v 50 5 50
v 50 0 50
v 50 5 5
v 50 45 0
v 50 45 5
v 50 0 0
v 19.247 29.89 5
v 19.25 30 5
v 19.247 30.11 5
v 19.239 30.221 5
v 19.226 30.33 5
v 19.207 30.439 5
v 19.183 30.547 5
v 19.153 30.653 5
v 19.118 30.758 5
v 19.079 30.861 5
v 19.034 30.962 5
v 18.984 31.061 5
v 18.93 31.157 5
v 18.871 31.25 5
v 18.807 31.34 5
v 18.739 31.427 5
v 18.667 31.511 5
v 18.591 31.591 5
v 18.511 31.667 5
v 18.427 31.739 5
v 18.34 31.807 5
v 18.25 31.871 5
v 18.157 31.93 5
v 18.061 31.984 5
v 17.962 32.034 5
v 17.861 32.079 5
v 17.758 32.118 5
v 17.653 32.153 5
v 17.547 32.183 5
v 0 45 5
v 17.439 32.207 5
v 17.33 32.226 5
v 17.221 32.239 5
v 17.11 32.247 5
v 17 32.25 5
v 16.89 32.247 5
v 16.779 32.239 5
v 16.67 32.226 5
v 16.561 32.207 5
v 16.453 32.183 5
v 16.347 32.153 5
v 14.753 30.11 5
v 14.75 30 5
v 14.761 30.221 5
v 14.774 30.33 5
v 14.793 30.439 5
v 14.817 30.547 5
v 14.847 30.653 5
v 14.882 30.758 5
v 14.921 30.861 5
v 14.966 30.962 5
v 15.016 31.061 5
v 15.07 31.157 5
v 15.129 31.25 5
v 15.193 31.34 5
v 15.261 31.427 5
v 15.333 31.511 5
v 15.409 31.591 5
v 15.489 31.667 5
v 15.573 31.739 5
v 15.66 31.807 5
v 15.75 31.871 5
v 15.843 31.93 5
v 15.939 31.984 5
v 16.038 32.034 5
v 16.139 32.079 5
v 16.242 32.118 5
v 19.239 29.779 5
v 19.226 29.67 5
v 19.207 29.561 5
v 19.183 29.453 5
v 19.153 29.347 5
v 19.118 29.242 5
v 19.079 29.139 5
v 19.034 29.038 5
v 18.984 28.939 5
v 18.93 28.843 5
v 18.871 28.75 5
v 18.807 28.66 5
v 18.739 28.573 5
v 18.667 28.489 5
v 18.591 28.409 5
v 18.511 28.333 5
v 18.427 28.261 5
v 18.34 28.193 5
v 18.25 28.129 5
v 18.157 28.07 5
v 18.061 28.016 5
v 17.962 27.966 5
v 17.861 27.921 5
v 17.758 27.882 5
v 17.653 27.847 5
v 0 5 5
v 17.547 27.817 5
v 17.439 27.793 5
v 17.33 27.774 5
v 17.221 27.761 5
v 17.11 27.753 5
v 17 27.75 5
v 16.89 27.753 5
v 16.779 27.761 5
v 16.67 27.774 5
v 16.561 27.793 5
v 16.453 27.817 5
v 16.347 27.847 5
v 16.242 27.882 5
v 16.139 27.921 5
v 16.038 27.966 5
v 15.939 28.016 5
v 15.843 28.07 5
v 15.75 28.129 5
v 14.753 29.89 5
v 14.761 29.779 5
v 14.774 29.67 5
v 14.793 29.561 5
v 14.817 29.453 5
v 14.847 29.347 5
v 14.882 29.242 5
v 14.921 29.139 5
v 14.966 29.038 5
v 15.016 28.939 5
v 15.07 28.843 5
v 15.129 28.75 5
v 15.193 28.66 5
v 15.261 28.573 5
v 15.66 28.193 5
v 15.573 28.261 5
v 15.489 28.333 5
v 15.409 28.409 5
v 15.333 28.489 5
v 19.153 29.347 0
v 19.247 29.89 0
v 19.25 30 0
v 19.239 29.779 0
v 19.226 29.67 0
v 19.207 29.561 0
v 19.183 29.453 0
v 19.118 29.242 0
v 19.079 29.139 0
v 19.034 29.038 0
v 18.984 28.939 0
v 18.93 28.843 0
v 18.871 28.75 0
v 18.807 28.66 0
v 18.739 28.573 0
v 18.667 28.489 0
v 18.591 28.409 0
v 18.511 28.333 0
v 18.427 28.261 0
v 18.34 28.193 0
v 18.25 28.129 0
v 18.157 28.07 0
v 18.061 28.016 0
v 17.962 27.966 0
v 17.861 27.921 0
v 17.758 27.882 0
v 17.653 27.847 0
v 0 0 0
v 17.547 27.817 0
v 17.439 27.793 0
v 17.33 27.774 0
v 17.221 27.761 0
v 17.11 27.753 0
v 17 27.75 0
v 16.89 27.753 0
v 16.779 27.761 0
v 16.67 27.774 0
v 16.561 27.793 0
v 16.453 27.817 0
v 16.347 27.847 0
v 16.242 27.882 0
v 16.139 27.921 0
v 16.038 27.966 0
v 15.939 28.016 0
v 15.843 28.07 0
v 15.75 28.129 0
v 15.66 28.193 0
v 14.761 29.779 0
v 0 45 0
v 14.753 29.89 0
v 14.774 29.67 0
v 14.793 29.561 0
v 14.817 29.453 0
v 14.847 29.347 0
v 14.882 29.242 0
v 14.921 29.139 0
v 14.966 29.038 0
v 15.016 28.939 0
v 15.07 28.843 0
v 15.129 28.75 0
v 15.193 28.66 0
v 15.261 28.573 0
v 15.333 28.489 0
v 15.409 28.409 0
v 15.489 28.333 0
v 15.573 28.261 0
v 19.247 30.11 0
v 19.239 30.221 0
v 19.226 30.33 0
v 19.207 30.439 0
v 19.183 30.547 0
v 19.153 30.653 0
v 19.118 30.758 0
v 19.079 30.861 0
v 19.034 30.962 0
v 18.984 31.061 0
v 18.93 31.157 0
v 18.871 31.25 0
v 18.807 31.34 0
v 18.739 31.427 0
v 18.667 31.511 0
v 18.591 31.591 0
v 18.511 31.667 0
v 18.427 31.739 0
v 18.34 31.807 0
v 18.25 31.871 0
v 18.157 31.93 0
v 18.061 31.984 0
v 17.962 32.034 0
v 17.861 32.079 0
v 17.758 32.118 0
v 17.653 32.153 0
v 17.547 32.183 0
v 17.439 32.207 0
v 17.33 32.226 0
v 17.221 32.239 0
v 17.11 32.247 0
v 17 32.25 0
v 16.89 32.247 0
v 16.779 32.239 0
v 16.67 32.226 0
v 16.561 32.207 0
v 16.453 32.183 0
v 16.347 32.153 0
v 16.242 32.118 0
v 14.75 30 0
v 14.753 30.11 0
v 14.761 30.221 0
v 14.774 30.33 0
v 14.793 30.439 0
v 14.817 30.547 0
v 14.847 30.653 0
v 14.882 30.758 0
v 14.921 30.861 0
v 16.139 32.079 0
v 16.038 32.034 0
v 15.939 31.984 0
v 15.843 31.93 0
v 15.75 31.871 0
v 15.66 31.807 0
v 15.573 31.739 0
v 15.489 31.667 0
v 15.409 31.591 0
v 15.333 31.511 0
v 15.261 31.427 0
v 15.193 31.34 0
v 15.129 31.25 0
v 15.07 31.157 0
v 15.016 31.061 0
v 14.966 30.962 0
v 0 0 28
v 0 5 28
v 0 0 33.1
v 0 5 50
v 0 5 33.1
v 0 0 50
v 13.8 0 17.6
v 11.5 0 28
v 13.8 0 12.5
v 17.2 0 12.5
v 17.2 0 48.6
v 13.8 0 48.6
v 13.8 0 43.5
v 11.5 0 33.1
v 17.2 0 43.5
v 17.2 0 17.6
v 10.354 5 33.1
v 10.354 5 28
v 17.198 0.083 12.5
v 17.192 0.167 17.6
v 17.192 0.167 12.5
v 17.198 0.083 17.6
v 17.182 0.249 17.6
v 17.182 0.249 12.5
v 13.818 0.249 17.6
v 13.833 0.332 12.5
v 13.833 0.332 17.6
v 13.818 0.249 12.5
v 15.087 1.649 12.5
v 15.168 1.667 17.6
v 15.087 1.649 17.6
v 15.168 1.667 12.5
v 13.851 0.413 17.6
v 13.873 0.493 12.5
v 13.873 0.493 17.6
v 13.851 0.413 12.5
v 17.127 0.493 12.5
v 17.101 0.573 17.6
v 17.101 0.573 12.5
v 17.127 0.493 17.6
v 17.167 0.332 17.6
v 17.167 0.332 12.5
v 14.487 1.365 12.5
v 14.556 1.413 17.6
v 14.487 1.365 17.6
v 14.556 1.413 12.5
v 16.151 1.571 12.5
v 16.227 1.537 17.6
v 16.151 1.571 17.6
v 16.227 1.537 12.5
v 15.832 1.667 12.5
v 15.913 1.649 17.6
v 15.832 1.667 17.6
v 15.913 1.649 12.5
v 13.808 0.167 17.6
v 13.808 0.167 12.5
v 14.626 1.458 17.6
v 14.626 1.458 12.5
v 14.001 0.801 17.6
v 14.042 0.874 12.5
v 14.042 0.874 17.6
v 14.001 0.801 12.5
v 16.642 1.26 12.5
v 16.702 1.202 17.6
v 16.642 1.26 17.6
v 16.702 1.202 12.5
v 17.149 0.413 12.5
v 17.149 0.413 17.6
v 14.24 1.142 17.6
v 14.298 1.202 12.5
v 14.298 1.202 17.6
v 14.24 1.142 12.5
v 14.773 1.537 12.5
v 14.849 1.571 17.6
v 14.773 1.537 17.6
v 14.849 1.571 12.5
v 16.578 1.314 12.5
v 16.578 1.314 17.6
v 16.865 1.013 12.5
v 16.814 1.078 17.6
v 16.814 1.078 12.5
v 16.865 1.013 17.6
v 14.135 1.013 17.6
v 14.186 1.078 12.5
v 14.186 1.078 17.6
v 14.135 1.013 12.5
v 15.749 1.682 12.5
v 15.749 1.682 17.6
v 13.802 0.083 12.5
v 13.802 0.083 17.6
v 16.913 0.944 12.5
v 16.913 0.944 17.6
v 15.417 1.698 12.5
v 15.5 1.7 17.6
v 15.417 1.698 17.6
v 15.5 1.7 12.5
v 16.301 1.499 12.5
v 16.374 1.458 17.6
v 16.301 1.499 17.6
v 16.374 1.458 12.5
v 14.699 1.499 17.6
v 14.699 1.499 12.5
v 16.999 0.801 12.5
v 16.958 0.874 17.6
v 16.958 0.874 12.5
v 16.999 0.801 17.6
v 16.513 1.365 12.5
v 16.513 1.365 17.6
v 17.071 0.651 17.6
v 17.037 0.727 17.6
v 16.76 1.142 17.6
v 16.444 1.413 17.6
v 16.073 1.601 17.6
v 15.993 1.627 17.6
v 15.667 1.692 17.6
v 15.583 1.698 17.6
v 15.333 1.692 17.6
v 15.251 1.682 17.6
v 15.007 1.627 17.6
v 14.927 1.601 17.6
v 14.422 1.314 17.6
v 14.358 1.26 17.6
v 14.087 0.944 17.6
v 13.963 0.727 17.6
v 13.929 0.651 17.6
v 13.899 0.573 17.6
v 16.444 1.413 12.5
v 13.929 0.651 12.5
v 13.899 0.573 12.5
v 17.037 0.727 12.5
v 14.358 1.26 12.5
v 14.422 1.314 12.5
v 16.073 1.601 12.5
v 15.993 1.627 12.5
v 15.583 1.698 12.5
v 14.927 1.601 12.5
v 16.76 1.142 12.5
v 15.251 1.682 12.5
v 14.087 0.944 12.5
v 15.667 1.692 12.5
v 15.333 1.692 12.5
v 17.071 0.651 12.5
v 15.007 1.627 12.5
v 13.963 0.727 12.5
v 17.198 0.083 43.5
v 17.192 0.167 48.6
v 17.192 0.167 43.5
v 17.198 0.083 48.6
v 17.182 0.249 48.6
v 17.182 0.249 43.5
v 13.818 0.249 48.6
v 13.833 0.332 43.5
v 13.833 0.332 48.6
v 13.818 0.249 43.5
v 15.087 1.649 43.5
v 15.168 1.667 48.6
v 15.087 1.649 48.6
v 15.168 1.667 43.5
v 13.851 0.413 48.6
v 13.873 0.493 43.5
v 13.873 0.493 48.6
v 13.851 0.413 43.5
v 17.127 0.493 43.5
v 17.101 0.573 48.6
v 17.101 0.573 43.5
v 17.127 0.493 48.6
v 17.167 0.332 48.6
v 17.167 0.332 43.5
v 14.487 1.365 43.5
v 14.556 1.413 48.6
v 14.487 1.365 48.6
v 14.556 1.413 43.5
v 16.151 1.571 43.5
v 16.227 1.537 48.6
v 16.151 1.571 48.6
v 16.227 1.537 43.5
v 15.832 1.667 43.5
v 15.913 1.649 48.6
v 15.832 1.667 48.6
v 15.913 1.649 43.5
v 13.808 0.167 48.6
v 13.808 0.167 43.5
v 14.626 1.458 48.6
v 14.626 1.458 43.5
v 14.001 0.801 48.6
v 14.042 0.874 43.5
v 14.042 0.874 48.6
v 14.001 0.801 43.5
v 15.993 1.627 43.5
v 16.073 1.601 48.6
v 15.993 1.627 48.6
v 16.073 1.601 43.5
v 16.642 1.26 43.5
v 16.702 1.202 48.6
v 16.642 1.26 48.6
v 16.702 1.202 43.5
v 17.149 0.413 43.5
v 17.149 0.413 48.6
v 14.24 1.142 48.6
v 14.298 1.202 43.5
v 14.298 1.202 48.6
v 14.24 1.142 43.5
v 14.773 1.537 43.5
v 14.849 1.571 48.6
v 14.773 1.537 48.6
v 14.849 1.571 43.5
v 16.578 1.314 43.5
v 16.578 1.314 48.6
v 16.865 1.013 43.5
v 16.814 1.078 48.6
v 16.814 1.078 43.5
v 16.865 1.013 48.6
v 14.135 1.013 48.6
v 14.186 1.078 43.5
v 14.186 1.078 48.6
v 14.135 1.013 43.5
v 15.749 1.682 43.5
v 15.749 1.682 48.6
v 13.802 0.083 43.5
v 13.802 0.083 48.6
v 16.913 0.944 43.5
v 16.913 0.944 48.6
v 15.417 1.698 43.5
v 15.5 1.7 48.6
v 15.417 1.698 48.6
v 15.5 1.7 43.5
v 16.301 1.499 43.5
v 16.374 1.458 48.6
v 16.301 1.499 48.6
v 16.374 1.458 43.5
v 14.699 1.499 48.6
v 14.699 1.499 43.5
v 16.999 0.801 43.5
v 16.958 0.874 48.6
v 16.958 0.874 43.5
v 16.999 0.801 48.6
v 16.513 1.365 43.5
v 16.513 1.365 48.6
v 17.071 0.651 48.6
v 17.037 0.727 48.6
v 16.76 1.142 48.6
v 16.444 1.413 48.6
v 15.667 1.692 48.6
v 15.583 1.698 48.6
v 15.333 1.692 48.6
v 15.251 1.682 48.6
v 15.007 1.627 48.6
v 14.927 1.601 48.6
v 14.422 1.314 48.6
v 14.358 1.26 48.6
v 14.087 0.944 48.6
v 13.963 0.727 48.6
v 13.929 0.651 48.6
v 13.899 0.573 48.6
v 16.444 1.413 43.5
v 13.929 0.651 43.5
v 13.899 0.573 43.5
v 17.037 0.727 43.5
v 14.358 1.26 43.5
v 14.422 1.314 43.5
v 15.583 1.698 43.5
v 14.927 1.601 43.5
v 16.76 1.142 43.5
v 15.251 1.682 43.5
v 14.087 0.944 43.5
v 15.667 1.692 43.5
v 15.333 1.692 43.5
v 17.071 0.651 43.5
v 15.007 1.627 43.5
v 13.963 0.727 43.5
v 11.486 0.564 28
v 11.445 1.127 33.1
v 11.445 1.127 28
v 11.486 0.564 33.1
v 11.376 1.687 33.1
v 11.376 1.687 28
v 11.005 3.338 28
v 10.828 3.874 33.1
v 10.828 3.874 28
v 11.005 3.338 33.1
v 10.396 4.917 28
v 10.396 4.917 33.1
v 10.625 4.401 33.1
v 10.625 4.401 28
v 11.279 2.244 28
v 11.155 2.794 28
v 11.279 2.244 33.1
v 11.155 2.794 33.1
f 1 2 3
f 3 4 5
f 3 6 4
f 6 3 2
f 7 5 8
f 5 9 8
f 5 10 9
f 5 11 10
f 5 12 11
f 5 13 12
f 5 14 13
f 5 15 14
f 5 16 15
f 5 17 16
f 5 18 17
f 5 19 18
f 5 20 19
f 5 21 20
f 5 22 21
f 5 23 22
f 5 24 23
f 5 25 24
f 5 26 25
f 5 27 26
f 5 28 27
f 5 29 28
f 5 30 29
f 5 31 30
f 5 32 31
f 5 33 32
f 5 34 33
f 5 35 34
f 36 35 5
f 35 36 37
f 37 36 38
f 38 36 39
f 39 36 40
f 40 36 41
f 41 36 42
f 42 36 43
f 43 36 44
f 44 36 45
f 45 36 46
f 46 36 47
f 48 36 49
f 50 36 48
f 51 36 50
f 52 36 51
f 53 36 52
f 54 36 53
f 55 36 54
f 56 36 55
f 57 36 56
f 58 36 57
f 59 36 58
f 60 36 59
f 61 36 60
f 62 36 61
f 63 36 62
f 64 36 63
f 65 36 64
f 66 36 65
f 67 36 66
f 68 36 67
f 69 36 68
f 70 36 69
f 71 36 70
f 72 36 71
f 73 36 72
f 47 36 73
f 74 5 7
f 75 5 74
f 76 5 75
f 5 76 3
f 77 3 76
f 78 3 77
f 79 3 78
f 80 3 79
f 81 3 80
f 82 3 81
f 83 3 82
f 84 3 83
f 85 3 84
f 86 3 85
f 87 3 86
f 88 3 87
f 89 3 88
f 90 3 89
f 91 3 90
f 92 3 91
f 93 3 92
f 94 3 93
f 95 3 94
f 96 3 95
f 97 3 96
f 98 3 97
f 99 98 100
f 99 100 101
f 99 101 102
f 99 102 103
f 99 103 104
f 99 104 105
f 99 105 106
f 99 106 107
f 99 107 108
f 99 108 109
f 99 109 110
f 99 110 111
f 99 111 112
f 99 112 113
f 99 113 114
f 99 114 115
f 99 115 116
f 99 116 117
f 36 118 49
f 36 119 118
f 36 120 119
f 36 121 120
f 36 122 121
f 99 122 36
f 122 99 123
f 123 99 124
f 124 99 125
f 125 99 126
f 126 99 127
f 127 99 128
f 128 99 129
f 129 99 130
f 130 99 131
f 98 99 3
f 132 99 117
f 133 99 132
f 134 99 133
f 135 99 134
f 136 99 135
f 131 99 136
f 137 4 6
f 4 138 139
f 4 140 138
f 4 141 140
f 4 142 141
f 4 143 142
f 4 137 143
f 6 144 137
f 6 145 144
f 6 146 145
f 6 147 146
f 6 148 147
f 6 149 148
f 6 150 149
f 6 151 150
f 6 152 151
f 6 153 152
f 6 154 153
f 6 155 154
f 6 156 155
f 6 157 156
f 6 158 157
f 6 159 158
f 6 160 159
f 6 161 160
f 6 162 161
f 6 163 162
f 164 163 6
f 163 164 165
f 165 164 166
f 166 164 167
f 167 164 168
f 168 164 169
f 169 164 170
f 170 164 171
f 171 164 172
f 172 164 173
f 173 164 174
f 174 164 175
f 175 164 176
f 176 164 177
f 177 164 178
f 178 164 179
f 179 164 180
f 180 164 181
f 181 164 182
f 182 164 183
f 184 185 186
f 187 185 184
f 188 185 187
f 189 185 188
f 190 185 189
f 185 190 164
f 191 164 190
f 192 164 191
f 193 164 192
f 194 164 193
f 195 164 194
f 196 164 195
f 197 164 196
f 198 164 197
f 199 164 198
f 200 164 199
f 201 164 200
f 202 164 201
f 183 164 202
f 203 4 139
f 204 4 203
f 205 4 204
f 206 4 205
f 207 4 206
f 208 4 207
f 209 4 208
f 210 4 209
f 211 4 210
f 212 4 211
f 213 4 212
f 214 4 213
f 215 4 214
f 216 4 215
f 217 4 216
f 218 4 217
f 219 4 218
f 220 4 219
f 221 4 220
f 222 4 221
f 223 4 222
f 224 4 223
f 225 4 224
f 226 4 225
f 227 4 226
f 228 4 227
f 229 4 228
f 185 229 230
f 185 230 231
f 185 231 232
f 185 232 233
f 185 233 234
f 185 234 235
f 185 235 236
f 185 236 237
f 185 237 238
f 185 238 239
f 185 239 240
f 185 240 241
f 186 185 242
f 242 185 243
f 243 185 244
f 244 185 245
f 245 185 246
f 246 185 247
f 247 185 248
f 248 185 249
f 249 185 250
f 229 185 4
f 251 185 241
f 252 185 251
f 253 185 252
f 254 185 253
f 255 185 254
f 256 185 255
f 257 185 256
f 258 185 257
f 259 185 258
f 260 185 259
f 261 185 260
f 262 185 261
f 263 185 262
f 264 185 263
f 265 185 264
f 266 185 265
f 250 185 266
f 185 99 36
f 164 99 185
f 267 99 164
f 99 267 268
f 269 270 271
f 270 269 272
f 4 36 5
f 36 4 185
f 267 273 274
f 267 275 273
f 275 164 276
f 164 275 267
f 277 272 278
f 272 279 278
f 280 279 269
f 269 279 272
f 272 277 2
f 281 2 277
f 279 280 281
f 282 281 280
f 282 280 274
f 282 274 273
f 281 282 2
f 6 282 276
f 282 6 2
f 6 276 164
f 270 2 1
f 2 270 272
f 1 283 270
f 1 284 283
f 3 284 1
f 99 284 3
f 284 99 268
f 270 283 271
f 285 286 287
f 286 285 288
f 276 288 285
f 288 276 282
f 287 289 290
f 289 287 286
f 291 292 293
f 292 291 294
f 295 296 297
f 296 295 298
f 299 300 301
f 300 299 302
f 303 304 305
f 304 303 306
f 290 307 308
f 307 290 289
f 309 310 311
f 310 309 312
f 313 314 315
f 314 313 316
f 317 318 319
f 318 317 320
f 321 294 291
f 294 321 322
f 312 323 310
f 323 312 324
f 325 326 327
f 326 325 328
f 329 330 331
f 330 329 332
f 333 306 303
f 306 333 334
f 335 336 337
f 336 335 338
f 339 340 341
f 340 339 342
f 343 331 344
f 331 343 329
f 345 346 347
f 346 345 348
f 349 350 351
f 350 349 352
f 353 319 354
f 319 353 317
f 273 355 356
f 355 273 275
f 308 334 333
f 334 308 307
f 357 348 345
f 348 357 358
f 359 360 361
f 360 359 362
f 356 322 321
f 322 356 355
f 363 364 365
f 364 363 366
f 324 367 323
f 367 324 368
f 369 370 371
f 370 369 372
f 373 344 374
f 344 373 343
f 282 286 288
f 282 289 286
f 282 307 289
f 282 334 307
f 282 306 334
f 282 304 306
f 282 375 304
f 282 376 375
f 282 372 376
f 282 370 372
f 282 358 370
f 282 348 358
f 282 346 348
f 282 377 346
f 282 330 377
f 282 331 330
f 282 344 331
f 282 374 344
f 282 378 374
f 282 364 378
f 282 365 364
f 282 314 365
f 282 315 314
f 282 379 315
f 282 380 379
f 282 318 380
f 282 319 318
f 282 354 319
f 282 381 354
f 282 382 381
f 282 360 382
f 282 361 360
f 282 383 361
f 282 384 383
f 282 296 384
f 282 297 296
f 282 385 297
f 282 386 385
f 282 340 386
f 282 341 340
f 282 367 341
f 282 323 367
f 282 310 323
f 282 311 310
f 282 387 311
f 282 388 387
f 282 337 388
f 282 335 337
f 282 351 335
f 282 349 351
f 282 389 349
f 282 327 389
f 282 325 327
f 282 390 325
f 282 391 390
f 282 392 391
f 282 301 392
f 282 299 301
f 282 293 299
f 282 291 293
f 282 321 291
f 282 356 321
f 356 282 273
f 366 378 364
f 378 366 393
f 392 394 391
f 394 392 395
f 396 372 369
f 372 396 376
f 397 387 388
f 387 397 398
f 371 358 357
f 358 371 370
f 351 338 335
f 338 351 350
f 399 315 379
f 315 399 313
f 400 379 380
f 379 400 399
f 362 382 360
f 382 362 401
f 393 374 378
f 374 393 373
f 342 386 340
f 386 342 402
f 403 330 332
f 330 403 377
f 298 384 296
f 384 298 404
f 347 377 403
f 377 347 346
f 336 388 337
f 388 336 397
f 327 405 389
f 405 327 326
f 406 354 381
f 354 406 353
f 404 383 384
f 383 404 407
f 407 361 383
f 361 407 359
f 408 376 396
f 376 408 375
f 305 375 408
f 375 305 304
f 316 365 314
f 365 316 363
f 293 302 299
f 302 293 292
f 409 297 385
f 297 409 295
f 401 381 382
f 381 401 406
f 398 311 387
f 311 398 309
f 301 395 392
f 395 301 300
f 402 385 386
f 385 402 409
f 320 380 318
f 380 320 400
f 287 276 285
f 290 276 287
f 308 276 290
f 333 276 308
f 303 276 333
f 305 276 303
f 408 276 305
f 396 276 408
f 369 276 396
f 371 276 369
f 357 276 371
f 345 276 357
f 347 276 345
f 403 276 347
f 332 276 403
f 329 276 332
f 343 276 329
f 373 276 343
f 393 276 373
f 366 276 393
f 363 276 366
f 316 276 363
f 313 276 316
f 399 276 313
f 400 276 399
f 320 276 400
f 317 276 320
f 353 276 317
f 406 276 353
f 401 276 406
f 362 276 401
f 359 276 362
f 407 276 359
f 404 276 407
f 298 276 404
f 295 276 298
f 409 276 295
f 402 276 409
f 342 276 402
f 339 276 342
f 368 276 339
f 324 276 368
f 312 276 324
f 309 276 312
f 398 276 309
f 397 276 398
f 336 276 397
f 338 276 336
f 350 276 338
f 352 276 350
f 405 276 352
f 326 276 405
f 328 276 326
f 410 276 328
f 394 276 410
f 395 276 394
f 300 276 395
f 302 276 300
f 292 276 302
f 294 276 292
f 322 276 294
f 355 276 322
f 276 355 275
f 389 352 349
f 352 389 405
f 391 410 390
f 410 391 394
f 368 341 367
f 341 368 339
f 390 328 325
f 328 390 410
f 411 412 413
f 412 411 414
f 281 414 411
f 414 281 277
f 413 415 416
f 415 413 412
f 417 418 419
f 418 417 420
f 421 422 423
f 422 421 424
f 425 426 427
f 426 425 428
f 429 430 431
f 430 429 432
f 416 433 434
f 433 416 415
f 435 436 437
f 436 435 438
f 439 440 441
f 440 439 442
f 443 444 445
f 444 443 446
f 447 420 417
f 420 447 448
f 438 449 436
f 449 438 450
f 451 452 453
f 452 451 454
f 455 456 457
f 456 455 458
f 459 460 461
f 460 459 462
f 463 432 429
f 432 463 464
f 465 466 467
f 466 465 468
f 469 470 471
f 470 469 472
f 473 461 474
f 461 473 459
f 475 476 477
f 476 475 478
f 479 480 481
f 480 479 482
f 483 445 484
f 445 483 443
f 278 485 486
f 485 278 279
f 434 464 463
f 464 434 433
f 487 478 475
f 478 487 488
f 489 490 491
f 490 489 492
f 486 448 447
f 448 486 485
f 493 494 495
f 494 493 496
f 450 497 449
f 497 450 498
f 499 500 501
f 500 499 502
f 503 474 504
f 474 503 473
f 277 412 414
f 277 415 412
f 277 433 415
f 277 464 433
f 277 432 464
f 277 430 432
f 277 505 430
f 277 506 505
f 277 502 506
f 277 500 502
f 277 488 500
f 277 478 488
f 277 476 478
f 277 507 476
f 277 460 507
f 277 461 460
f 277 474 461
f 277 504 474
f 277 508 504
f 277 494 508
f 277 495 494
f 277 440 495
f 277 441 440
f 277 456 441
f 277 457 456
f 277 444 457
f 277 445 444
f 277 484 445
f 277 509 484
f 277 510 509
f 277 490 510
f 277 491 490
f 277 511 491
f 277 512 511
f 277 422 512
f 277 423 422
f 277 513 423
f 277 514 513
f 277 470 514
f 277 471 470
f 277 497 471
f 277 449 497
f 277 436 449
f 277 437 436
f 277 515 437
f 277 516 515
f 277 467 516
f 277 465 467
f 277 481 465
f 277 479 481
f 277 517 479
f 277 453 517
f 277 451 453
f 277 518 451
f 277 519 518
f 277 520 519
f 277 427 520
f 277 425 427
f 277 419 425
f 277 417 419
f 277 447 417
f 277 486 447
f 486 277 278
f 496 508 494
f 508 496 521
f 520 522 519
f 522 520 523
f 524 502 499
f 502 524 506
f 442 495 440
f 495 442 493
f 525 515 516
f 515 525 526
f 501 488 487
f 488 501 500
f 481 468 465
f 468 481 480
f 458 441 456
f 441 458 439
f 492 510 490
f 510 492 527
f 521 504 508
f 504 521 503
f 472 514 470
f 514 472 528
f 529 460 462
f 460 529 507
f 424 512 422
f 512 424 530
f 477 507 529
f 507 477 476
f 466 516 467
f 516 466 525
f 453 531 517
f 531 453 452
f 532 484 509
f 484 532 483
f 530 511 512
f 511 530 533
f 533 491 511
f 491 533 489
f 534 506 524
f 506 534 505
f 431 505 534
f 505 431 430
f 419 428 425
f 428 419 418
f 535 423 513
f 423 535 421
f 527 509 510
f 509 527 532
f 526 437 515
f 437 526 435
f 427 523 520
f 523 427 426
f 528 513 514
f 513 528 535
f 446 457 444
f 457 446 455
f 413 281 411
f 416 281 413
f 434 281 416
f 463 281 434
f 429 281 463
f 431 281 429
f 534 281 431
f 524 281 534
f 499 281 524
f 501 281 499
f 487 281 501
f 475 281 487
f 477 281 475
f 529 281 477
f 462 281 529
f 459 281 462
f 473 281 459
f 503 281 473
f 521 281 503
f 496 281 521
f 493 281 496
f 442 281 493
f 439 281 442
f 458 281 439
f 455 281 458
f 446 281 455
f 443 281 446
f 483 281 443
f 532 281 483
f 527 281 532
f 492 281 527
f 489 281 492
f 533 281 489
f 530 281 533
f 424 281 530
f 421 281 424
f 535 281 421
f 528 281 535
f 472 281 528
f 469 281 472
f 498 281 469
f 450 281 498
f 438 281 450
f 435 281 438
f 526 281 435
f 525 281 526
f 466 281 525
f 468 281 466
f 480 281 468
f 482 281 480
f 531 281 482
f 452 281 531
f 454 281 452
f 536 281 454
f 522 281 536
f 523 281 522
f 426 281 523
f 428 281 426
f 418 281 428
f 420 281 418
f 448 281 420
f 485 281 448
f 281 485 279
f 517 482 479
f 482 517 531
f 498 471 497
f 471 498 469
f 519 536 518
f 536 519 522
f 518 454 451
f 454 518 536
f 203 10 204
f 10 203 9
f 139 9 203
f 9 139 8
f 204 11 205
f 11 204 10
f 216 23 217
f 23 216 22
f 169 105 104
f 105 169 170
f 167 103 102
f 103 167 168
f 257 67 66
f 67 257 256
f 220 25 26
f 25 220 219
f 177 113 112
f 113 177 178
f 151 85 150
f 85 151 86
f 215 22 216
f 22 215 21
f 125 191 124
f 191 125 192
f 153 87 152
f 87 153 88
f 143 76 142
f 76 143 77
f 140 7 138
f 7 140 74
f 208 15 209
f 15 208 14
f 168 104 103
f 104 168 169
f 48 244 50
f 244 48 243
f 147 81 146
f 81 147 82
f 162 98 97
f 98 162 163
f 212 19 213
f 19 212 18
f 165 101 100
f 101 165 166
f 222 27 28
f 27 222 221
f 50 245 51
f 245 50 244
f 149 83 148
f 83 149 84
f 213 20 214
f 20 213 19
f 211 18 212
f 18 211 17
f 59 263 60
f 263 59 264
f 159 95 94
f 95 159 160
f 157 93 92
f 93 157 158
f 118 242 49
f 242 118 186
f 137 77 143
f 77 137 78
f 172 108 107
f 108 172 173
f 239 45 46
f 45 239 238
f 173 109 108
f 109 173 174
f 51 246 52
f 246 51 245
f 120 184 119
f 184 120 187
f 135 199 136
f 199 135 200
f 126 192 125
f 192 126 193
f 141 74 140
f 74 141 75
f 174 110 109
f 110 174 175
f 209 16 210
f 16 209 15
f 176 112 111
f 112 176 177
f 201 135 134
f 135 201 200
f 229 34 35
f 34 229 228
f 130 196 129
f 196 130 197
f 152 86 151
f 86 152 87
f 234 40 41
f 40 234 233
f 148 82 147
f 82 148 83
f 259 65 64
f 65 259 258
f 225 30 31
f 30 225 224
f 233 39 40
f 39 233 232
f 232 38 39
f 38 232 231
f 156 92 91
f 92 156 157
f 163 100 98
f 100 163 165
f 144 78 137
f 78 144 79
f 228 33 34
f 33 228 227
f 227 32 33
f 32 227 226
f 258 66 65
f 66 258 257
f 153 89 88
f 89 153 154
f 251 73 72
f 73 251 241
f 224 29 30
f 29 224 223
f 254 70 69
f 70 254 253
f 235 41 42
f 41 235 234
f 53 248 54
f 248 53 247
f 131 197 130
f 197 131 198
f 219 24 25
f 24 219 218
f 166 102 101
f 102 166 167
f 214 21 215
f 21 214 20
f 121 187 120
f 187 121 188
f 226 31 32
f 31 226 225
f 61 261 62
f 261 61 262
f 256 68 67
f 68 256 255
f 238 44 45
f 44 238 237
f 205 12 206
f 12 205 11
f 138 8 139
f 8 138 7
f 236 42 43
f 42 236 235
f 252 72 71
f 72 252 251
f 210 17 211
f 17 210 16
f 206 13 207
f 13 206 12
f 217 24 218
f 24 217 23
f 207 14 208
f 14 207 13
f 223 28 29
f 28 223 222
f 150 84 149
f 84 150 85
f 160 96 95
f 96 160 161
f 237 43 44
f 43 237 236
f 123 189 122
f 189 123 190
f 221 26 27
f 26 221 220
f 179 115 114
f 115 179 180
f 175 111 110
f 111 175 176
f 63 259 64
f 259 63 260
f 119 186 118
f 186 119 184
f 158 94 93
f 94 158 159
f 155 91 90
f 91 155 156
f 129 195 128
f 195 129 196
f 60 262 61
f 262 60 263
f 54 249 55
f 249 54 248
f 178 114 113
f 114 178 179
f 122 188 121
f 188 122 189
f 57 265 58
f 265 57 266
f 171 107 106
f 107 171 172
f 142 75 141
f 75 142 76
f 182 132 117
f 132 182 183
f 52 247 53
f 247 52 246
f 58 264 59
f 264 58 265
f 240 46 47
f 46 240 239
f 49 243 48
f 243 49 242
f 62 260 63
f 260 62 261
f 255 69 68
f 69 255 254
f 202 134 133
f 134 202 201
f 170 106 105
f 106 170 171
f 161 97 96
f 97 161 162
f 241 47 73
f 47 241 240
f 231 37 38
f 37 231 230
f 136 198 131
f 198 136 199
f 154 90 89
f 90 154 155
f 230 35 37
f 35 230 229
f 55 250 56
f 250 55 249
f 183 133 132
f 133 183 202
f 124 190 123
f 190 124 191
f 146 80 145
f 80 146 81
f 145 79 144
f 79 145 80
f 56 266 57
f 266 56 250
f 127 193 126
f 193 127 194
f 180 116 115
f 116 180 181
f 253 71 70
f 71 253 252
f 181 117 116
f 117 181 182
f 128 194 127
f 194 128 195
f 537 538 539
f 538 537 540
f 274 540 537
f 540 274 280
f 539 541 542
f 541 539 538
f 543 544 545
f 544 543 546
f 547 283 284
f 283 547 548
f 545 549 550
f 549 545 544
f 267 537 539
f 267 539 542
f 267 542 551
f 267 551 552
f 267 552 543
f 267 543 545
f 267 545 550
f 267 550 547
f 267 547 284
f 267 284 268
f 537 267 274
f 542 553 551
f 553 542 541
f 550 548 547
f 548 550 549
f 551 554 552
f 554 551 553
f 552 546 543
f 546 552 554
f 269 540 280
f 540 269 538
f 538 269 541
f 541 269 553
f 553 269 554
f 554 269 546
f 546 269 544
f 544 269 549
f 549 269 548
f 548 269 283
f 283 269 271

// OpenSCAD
$fn = 128;

// --- Base Plate Dimensions ---
// X range: -25 to 25 (Width = 50)
// Y range: 0 to 45 (Depth = 45)
// Z range: 0 to 5 (Thickness = 5)
BASE_X_MIN = -25;
BASE_X_MAX = 25;
BASE_Y_MIN = 0;
BASE_Y_MAX = 45;
BASE_Z_MAX = 5;

// --- Base Plate Holes (M4) ---
// Position: x = -17, y = 30 and x = 17, y = 30
// Diameter: 4.5 mm
BASE_HOLE_X_1 = -17;
BASE_HOLE_Y_1 = 30;
BASE_HOLE_X_2 = 17;
BASE_HOLE_Y_2 = 30;
BASE_HOLE_DIAMETER = 4.5;

// --- Vertical Motor Plate Dimensions ---
// X range: -25 to 25 (Width = 50)
// Y range: 0 to 5 (Depth = 5)
// Z range: 0 to 50 (Height = 50)
// Stands on the back edge of the base (y=0 to y=5)
MOTOR_X_MIN = -25;
MOTOR_X_MAX = 25;
MOTOR_Y_MAX = 5;
MOTOR_Z_MAX = 50;

// --- Motor Plate Boss Hole ---
// Diameter: 23 mm
// Centre: x = 0, z = 28
// Cut along Y axis (through the plate)
BOSS_HOLE_DIAMETER = 23;
BOSS_HOLE_X = 0;
BOSS_HOLE_Z = 28;

// --- Motor Plate Screw Holes (M3) ---
// Diameter: 3.4 mm
// Pattern: 31 mm square, centred on boss hole (x=0, z=28)
// 4 holes total
SCREW_HOLE_DIAMETER = 3.4;
SCREW_PATTERN_SIZE = 31;

// --- Gusset Dimensions ---
// Thickness: 5 mm (same as base)
// Location: Left (x=-25 to -20) and Right (x=20 to 25)
// Shape: Right triangle in YZ plane
// Legs: 20 mm along +Y, 20 mm along +Z
// Right-angle corner at y=5, z=5
GUSSET_THICKNESS = 5;
GUSSET_Y_LEG = 20;
GUSSET_Z_LEG = 20;
GUSSET_CORNER_Y = 5;
GUSSET_CORNER_Z = 5;
GUSSET_LEFT_X_MIN = -25;
GUSSET_LEFT_X_MAX = -20;
GUSSET_RIGHT_X_MIN = 20;
GUSSET_RIGHT_X_MAX = 25;

// --- Construction ---

difference() {
    union() {
        // 1. Base Plate
        translate([0, 0, 0]) {
            cube([
                BASE_X_MAX - BASE_X_MIN,
                BASE_Y_MAX - BASE_Y_MIN,
                BASE_Z_MAX
            ]);
        }

        // 2. Vertical Motor Plate
        translate([0, 0, 0]) {
            cube([
                MOTOR_X_MAX - MOTOR_X_MIN,
                MOTOR_Y_MAX,
                MOTOR_Z_MAX
            ]);
        }

        // 3. Left Gusset
        // Right triangle in YZ plane, extruded along X
        // Vertices for polygon (Y, Z): (0,0), (GUSSET_Y_LEG, 0), (GUSSET_Y_LEG, GUSSET_Z_LEG), (0, GUSSET_Z_LEG)
        // Wait, description says: "right-angle corner at y = 5, z = 5".
        // The plate ends at y=5, z=5. The gusset adds material.
        // Legs are 20mm along +Y and 20mm along +Z.
        // So the triangle vertices relative to the corner (5,5) are:
        // (5,5), (5+20, 5), (5, 5+20).
        // Let's define the polygon points in YZ plane:
        // P1: (5, 5) - Corner
        // P2: (25, 5) - End of Y leg
        // P3: (5, 25) - End of Z leg
        // This forms a right triangle.
        translate([GUSSET_LEFT_X_MIN, 0, 0]) {
            polygon([
                [0, 0], // Relative to corner (5,5) -> (5,5)
                [GUSSET_Y_LEG, 0], // Relative -> (25,5)
                [0, GUSSET_Z_LEG]  // Relative -> (5,25)
            ],
            h = GUSSET_THICKNESS
            );
        }

        // 4. Right Gusset
        translate([GUSSET_RIGHT_X_MIN, 0, 0]) {
            polygon([
                [0, 0],
                [GUSSET_Y_LEG, 0],
                [0, GUSSET_Z_LEG]
            ],
            h = GUSSET_THICKNESS
            );
        }
    }

    // Cut Holes (Base Plate)
    // Hole 1
    translate([BASE_HOLE_X_1, BASE_HOLE_Y_1, 0]) {
        cylinder(h = BASE_Z_MAX + 0.1, d = BASE_HOLE_DIAMETER);
    }
    // Hole 2
    translate([BASE_HOLE_X_2, BASE_HOLE_Y_2, 0]) {
        cylinder(h = BASE_Z_MAX + 0.1, d = BASE_HOLE_DIAMETER);
    }

    // Cut Boss Hole (Motor Plate)
    // Centre at x=0, z=28. Extends through the plate (y=0 to y=5).
    // To ensure clean cut, extend slightly in Y.
    translate([BOSS_HOLE_X, 0, BOSS_HOLE_Z]) {
        cylinder(h = MOTOR_Y_MAX + 0.1, d = BOSS_HOLE_DIAMETER);
    }

    // Cut Screw Holes (Motor Plate)
    // 4 holes on 31mm square pattern centred at (0, 28)
    // Square side = 31, so half-side = 15.5
    // Coordinates: x = +/- 15.5, z = 28 +/- 15.5
    for (i = [-1, 1]) {
        for (j = [-1, 1]) {
            translate([
                i * (SCREW_PATTERN_SIZE / 2),
                0,
                BOSS_HOLE_Z + j * (SCREW_PATTERN_SIZE / 2)
            ]) {
                cylinder(h = MOTOR_Y_MAX + 0.1, d = SCREW_HOLE_DIAMETER);
            }
        }
    }
}
